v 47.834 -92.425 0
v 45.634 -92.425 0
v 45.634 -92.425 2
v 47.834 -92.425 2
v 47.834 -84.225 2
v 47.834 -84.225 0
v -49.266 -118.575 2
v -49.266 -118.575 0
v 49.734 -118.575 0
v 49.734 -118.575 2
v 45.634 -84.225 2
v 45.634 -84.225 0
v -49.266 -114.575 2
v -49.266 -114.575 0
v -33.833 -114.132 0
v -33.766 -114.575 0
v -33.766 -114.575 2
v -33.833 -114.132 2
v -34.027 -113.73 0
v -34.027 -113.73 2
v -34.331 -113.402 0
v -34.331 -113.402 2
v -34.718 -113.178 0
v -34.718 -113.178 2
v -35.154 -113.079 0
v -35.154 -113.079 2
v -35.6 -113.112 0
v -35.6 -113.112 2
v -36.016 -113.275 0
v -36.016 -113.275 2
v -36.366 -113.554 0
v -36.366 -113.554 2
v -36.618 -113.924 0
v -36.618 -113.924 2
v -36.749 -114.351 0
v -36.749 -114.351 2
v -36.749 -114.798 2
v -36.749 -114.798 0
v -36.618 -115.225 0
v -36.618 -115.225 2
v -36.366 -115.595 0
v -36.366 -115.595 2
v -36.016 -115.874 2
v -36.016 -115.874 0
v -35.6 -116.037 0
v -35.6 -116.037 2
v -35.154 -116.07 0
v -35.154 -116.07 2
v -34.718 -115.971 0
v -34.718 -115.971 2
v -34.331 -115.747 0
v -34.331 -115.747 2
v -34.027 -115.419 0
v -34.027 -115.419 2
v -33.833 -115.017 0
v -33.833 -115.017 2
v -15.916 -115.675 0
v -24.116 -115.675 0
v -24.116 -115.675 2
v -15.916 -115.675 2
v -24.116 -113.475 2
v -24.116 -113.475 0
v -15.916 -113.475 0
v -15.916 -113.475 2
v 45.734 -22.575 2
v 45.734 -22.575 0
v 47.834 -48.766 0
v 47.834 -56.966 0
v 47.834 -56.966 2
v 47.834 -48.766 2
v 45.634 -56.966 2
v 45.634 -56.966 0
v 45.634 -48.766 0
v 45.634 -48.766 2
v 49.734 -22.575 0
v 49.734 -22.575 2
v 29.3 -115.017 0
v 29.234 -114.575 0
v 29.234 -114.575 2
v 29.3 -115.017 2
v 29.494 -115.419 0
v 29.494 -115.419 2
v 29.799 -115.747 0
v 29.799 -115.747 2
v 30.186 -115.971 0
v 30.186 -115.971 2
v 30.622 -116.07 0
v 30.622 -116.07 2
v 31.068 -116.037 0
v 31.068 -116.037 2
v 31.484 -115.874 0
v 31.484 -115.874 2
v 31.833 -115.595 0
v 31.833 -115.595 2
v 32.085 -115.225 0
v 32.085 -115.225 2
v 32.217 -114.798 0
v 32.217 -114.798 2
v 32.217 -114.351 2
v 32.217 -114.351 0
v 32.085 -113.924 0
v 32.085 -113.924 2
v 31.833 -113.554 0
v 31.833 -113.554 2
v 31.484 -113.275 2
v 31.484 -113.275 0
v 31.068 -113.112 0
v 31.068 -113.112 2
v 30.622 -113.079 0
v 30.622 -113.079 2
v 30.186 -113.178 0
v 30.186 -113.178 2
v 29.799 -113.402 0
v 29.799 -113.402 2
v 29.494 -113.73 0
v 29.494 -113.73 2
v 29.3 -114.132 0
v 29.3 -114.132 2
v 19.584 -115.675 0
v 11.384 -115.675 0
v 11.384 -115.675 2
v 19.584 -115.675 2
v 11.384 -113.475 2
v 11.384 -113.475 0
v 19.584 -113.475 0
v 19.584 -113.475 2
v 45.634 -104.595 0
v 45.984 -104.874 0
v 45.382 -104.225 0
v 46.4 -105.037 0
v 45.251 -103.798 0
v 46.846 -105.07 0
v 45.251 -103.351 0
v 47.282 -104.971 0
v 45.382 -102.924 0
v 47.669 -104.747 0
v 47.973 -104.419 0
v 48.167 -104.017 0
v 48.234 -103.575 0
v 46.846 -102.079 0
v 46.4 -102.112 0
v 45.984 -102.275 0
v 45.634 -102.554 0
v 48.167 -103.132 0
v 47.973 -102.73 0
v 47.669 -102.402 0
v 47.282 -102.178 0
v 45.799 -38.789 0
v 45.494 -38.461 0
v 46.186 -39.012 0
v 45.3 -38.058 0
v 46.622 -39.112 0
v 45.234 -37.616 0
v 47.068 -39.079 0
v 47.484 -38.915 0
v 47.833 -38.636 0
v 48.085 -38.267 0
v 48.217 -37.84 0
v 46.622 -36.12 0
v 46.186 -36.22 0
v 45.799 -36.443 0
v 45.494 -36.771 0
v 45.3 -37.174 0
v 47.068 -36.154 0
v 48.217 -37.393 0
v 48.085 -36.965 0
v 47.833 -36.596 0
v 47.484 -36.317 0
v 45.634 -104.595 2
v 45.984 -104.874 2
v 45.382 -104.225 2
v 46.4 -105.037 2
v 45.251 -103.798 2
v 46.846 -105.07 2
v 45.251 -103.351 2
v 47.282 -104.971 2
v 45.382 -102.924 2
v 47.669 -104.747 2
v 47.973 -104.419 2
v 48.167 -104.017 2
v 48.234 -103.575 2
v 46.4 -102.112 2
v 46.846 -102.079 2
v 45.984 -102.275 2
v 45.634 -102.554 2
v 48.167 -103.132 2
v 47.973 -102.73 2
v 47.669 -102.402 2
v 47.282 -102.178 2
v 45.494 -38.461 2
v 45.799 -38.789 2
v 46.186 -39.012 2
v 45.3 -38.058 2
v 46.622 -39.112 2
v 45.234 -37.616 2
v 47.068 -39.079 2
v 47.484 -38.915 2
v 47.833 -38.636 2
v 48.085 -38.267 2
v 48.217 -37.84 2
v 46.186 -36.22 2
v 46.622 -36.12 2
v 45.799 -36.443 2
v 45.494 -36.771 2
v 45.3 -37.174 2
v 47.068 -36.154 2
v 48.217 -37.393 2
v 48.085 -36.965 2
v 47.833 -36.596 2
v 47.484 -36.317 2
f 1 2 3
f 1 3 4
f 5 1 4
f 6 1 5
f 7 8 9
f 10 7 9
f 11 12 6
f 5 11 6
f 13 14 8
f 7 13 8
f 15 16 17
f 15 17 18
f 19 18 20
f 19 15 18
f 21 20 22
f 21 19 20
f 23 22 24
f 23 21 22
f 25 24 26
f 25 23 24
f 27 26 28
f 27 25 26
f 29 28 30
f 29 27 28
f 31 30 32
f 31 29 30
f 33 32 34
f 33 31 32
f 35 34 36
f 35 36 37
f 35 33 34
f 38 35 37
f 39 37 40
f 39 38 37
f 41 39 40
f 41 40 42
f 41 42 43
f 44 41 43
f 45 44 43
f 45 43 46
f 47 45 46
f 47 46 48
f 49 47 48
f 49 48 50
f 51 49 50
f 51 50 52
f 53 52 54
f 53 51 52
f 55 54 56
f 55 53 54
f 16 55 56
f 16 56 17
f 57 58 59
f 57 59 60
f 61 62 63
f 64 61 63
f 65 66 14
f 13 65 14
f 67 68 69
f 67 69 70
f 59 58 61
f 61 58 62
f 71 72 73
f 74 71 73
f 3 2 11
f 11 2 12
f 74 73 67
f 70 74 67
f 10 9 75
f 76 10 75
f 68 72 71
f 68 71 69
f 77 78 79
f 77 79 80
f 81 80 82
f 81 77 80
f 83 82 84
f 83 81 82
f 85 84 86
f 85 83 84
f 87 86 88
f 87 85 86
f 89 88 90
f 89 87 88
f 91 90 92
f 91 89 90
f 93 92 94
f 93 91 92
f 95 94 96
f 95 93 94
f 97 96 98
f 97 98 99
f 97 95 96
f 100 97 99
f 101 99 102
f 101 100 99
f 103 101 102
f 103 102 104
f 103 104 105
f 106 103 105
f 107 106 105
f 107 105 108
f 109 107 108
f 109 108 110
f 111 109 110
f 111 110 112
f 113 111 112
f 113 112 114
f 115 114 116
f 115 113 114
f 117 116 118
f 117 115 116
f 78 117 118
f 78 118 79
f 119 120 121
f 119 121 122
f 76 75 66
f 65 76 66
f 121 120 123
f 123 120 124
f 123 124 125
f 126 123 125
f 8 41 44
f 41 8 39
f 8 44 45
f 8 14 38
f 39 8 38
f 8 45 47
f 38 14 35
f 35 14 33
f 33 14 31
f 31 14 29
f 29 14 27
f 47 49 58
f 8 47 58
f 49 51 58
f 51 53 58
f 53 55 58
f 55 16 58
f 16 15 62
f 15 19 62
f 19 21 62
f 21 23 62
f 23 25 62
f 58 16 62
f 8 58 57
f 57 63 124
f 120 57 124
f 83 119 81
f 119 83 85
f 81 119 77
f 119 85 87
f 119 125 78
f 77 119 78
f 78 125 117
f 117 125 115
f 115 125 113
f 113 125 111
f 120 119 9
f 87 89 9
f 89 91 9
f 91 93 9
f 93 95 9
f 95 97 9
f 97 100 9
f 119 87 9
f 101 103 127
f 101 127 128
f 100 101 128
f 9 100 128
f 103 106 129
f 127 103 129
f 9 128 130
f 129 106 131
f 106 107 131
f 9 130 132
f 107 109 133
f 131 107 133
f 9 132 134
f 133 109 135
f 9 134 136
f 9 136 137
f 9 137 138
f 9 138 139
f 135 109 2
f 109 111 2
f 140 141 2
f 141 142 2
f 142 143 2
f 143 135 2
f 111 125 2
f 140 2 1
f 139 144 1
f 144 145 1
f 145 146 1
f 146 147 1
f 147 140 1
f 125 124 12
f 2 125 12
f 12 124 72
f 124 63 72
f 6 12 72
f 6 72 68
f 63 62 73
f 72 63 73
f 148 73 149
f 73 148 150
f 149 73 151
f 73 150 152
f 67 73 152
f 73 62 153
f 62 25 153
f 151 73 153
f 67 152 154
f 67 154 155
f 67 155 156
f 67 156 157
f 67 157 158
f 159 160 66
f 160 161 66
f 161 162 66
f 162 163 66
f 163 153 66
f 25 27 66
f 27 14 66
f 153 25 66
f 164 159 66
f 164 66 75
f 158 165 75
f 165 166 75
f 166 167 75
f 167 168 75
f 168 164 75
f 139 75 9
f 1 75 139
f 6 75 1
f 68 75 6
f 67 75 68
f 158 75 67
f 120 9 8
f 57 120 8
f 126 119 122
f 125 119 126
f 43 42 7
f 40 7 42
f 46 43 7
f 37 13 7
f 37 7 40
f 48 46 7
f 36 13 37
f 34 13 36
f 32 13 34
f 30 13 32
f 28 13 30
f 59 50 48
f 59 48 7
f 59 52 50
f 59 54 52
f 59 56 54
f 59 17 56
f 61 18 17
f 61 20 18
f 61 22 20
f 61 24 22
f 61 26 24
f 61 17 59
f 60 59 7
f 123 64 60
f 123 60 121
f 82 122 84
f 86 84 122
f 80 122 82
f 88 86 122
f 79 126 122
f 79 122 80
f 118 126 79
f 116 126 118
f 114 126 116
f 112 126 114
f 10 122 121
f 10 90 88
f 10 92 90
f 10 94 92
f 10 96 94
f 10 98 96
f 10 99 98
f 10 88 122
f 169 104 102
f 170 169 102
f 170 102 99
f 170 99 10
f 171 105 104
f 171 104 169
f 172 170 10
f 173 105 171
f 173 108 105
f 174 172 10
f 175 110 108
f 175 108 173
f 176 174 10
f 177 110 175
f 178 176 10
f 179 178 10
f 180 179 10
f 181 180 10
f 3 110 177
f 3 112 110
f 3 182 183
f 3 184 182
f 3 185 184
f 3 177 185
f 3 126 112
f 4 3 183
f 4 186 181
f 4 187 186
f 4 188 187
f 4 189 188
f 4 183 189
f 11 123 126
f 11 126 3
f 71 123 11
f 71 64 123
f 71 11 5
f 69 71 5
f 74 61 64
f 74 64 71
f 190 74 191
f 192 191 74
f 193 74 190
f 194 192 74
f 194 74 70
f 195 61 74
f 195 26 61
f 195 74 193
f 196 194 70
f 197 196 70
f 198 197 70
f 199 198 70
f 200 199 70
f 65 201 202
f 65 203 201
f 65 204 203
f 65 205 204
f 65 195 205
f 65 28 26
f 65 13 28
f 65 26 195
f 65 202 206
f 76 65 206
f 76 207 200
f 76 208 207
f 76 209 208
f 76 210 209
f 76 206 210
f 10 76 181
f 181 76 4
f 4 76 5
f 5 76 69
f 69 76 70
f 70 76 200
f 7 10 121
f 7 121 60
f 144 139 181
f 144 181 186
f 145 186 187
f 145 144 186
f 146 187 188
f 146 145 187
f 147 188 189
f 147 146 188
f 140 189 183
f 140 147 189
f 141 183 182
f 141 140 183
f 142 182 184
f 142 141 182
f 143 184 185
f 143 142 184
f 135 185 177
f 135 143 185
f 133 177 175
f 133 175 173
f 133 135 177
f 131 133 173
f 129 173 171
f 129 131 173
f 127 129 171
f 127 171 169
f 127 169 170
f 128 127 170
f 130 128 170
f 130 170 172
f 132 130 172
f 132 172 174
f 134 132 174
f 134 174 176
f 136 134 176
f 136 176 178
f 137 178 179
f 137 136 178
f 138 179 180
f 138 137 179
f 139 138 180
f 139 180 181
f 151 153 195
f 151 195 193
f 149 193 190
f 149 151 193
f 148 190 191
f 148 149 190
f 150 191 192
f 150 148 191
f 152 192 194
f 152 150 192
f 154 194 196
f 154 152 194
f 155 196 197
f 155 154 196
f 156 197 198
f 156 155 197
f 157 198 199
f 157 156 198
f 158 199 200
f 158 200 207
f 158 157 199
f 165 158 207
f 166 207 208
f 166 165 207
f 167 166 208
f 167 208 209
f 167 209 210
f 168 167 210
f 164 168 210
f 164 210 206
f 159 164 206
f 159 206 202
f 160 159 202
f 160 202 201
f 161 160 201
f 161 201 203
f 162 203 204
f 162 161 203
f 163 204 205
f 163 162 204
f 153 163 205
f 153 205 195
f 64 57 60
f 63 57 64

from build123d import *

# Parameters (mm, degrees)
SKETCH_1_R      = 1.5
SKETCH_1_W      = 8.2
SKETCH_1_H      = 2.2
SKETCH_1_W_2    = 2.2
SKETCH_1_H_2    = 8.2
EXTRUDE_1_DEPTH = 2


with BuildPart() as part:
    # 草图1 → 凸台-拉伸1 (new body)
    with BuildSketch(Plane.XY):
        Polygon((44.733844386, -118.574512395), (48.733844386, -118.574512395), (49.733844386, -118.574512395), (49.733844386, -22.574512395), (45.733844386, -22.574512395), (-49.266155614, -114.574512396), (-49.266155614, -118.574512395), (-3.266155614, -118.574512395), align=None)
        with Locations((-35.266155614, -114.574512396)):
            Circle(SKETCH_1_R, mode=Mode.SUBTRACT)
        with Locations(Location((30.733844386, -114.574512396, 0), (0, 0, 180))):
            Circle(SKETCH_1_R, mode=Mode.SUBTRACT)
        with Locations((46.733844387, -103.574512395)):
            Circle(SKETCH_1_R, mode=Mode.SUBTRACT)
        with Locations(Location((46.733844387, -37.616179062, 0), (0, 0, 180))):
            Circle(SKETCH_1_R, mode=Mode.SUBTRACT)
        with Locations((-20.016155614, -114.574512396)):
            Rectangle(SKETCH_1_W, SKETCH_1_H, mode=Mode.SUBTRACT)
        with Locations((15.483844386, -114.574512396)):
            Rectangle(SKETCH_1_W, SKETCH_1_H, mode=Mode.SUBTRACT)
        with Locations((46.733844387, -88.324512395)):
            Rectangle(SKETCH_1_W_2, SKETCH_1_H_2, mode=Mode.SUBTRACT)
        with Locations((46.733844387, -52.866179062)):
            Rectangle(SKETCH_1_W_2, SKETCH_1_H_2, mode=Mode.SUBTRACT)
    extrude(amount=EXTRUDE_1_DEPTH)


solid = part.part
